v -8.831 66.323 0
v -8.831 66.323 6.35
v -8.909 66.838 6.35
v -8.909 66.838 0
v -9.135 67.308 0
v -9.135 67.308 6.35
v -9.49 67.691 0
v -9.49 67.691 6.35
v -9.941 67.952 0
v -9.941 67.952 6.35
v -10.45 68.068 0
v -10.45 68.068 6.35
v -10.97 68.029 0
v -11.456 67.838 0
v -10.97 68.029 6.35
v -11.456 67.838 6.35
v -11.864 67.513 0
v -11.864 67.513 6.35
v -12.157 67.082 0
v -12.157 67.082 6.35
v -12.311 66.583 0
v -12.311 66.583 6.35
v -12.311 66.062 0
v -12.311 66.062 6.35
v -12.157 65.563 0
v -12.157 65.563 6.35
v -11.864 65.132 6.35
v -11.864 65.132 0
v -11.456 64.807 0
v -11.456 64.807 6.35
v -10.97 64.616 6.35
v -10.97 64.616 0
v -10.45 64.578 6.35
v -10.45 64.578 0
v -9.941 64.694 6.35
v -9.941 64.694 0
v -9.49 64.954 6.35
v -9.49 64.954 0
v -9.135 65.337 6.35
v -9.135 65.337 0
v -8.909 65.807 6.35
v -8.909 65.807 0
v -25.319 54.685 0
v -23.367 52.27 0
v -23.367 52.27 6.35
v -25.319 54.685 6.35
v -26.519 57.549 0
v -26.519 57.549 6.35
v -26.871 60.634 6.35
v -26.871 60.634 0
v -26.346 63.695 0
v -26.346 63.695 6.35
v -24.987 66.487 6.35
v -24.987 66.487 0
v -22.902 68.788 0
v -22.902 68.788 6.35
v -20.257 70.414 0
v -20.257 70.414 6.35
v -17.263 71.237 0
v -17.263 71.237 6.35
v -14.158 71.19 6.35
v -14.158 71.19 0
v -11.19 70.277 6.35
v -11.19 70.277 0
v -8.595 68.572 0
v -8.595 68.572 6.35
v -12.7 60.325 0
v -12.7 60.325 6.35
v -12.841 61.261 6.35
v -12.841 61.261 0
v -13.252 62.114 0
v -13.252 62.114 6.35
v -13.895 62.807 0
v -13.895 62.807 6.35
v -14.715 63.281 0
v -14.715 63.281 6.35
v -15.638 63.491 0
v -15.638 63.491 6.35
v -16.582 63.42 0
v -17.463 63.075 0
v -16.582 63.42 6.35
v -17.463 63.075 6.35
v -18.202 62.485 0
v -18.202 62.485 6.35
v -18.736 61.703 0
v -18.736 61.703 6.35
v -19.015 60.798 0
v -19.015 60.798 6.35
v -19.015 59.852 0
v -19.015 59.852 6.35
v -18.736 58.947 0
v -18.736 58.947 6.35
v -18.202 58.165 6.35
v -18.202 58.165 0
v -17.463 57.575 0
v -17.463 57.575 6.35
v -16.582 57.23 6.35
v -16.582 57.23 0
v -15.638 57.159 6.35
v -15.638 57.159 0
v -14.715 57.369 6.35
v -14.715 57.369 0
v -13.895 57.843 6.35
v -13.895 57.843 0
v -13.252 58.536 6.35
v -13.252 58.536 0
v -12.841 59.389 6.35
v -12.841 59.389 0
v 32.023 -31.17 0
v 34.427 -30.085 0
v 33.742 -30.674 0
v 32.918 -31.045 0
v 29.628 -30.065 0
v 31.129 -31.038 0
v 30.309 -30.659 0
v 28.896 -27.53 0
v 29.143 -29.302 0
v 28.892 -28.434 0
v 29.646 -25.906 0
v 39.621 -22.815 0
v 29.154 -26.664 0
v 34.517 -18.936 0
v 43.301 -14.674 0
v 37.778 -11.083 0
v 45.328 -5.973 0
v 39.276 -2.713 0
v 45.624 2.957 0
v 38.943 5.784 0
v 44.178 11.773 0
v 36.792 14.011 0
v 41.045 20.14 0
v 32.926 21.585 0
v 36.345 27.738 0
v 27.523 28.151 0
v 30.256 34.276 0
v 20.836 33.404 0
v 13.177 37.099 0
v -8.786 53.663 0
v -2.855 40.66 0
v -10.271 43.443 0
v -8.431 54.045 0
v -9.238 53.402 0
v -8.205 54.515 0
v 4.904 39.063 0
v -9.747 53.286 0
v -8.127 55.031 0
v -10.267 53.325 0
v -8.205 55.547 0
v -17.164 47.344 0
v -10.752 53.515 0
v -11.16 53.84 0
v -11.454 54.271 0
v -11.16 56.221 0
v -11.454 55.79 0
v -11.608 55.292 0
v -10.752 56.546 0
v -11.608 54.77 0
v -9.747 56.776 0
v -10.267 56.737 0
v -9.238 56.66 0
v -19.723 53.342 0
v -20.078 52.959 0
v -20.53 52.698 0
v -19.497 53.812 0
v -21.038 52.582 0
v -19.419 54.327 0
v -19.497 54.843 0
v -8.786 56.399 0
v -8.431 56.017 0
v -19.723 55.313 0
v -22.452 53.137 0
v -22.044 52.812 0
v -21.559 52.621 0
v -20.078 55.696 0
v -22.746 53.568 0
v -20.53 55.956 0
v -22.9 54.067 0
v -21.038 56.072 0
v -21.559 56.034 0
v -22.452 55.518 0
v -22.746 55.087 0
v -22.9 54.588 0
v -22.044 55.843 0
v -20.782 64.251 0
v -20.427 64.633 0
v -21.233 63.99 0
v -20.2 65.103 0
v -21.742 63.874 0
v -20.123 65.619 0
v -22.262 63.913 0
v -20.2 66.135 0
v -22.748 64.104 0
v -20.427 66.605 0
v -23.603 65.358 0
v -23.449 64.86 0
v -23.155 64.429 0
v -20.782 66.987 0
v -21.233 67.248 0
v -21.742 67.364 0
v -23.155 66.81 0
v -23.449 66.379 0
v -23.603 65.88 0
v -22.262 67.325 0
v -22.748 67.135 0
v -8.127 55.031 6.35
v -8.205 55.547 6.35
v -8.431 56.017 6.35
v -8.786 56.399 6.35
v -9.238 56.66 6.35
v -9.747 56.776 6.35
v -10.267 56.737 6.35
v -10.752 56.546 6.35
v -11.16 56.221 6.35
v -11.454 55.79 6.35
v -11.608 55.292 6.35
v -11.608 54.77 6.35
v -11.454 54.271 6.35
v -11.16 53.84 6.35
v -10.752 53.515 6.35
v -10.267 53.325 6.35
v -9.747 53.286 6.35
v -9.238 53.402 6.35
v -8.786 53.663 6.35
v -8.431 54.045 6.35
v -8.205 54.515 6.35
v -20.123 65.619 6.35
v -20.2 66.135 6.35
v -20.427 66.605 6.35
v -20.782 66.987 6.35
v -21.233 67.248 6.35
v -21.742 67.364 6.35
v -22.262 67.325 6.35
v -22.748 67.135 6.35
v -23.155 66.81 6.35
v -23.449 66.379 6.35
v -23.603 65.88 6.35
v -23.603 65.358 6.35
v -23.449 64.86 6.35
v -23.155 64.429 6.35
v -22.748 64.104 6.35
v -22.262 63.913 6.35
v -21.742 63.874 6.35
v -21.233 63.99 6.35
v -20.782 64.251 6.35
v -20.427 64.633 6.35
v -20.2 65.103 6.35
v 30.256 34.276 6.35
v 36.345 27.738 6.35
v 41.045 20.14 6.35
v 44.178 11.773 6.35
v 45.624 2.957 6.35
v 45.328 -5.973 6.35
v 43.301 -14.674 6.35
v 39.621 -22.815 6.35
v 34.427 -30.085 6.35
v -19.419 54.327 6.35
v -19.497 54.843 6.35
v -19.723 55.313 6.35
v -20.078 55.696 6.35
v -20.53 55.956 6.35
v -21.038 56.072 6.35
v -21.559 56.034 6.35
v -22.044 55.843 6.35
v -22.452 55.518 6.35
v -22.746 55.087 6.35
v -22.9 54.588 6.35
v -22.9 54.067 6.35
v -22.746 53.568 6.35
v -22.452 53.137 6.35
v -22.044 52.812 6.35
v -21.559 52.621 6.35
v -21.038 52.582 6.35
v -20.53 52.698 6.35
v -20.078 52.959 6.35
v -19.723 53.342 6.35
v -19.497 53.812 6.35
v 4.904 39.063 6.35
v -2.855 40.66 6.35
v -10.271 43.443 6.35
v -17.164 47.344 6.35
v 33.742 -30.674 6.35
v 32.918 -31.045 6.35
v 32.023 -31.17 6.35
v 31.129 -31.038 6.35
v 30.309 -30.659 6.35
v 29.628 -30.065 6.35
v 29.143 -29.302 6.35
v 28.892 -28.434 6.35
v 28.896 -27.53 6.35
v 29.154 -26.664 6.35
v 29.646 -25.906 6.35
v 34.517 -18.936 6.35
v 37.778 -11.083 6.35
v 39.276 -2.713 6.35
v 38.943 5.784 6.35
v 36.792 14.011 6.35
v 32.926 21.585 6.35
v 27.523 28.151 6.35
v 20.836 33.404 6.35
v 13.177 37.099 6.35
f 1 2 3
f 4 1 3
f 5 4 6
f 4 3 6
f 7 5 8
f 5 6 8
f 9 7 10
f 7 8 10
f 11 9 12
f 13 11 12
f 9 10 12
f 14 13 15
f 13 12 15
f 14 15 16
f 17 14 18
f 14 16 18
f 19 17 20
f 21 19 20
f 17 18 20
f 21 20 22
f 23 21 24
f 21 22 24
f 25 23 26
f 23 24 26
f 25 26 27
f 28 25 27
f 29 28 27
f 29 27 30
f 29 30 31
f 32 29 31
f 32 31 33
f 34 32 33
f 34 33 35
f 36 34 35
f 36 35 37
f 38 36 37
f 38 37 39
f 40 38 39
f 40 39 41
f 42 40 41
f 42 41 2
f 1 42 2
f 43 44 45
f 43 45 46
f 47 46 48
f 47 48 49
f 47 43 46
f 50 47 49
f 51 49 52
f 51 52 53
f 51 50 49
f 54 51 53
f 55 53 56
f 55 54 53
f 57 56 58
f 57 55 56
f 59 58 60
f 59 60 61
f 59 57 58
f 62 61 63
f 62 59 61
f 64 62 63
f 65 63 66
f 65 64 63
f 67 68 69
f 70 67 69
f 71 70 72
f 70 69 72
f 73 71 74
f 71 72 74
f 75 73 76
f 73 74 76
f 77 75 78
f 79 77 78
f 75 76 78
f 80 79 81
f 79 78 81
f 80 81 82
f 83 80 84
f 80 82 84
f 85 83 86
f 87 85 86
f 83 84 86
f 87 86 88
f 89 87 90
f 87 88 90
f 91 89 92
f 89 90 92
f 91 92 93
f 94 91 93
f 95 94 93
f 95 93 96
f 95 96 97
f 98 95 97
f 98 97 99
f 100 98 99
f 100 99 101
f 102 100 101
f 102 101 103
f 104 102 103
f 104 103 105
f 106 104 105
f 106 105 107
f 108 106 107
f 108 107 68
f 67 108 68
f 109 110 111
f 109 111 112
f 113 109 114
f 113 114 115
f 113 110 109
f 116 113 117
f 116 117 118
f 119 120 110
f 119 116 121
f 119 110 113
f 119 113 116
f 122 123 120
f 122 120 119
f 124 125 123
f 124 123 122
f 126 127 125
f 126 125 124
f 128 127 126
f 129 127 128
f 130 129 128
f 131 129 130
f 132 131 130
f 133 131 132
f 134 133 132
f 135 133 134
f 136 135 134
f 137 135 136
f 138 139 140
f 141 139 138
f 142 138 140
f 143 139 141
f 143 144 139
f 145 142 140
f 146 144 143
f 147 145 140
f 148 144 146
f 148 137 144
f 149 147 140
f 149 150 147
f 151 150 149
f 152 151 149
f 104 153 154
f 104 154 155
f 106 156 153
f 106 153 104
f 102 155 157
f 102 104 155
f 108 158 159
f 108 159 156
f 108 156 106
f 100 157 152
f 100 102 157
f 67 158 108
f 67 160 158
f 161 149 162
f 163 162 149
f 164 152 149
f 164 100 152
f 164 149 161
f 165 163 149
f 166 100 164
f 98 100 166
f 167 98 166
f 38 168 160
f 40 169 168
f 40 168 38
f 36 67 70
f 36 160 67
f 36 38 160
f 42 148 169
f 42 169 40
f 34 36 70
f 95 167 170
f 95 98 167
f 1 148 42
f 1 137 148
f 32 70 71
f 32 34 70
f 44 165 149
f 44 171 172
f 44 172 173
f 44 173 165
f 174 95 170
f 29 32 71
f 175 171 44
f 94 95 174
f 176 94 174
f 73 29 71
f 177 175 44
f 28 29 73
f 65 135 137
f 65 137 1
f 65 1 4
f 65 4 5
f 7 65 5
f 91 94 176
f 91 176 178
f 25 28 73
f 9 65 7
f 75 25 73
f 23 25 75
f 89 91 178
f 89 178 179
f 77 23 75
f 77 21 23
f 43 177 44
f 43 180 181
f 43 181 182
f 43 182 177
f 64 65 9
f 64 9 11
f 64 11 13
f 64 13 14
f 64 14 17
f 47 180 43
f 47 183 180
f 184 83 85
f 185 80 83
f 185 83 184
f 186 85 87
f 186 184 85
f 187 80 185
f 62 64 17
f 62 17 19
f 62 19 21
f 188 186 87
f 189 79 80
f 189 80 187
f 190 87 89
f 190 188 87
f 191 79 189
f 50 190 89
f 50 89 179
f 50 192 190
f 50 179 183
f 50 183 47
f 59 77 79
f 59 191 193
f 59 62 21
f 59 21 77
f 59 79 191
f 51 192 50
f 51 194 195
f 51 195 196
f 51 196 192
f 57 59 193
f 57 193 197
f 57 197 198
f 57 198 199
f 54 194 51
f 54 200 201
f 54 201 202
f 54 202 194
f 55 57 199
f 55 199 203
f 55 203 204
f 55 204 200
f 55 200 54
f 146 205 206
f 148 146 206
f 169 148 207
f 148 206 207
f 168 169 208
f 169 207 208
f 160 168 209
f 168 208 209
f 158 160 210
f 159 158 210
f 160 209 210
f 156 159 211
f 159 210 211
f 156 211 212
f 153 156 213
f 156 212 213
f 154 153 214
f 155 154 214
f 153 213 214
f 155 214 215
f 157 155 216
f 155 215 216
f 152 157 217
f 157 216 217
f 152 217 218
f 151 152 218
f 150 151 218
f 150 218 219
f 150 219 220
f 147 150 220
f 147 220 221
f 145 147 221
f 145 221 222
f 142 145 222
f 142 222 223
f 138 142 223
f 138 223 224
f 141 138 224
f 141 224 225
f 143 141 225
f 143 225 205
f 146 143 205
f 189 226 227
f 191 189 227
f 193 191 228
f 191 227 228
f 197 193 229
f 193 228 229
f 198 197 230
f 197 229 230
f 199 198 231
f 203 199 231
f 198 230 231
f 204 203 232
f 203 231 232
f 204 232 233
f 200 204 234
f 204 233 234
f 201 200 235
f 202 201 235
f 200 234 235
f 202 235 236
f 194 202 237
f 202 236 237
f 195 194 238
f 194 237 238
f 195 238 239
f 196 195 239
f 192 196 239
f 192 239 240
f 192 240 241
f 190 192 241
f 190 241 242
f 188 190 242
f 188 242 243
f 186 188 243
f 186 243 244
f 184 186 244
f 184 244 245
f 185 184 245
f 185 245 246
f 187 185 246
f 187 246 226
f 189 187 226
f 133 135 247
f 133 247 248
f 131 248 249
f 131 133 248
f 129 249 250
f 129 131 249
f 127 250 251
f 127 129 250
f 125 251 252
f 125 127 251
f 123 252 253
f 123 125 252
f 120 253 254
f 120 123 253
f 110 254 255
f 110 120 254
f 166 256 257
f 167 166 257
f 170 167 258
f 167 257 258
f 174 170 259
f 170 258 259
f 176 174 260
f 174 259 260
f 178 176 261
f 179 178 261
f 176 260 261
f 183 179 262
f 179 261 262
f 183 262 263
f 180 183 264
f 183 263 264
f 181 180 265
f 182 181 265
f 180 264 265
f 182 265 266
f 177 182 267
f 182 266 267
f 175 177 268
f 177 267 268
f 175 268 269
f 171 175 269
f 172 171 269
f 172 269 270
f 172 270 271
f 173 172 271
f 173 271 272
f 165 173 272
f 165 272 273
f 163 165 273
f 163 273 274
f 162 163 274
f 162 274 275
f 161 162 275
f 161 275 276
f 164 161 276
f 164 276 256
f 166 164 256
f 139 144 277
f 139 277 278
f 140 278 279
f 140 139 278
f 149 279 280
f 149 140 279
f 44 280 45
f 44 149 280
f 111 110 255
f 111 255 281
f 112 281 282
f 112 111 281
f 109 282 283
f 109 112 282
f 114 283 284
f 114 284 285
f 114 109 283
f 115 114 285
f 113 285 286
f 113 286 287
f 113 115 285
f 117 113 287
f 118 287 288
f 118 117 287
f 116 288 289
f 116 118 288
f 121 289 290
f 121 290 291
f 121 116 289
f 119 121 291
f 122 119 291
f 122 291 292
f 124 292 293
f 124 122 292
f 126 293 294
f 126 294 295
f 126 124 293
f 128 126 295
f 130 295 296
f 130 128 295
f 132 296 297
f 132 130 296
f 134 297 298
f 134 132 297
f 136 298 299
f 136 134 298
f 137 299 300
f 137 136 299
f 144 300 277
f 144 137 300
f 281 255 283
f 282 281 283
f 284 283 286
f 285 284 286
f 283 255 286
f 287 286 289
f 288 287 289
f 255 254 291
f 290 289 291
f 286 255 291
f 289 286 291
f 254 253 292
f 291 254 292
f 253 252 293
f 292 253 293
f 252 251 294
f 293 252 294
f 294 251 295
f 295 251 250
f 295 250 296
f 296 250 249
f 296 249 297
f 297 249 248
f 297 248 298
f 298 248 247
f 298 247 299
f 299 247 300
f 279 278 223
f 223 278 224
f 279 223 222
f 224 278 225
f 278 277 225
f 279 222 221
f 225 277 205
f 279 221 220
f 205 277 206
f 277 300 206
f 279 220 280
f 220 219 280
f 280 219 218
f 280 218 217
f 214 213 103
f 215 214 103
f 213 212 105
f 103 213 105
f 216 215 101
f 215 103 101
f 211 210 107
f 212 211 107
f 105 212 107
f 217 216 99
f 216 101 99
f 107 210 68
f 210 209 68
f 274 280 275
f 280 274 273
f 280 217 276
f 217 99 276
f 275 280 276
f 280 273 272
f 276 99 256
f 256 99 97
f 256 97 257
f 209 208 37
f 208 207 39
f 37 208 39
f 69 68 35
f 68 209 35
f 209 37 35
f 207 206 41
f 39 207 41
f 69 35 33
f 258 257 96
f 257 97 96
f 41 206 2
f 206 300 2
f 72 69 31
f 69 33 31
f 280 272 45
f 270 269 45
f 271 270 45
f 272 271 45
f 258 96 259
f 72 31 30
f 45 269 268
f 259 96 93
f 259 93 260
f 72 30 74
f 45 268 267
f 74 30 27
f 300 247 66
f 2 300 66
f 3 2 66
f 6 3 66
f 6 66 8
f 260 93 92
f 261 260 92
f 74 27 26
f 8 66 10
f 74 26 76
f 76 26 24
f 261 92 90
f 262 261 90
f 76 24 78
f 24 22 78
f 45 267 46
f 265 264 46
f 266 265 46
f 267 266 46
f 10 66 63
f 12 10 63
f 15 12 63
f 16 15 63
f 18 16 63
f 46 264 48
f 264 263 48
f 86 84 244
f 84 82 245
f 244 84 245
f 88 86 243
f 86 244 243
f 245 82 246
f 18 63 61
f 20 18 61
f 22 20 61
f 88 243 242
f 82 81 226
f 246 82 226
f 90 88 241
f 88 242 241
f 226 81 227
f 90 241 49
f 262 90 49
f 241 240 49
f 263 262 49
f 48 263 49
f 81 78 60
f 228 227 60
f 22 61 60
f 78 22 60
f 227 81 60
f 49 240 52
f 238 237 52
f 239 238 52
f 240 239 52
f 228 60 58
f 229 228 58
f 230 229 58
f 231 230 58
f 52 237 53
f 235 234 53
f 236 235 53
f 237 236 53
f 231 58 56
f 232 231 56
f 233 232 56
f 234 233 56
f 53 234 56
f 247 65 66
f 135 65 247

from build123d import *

# Parameters (mm, degrees)
BOSS_EXTRUDE1_DEPTH = 6.35
SKETCH2_R           = 3.175
SKETCH2_R_2         = 1.75
CUT_EXTRUDE1_DEPTH  = 7.35


with BuildPart() as part:
    # Sketch1 → Boss-Extrude1 (new body)
    with BuildSketch(Plane.XY):
        with BuildLine():
            Line((-8.595455009, 68.571709933), (30.25643609, 34.276325287))
            ThreePointArc((30.25643609, 34.276325287), (45.624300947, 2.956613457), (34.427247837, -30.084597493))
            ThreePointArc((34.427247837, -30.084597493), (29.947258578, -30.386170434), (29.645685638, -25.906181175))
            ThreePointArc((29.645685638, -25.906181175), (36.792348261, 14.011424249), (4.903675305, 39.063421106))
            ThreePointArc((4.903675305, 39.063421106), (-10.270602503, 43.44261231), (-23.366607565, 52.270447493))
            ThreePointArc((-23.366607565, 52.270447493), (-24.02632087, 67.711201194), (-8.595455009, 68.571709933))
        make_face()
    extrude(amount=BOSS_EXTRUDE1_DEPTH)

    # Sketch2 → Cut-Extrude1 (cut, through all)
    with BuildSketch(Plane.XY.offset(6.35)):
        with Locations((-15.875, 60.325)):
            Circle(SKETCH2_R)
        with Locations((-10.580785461, 66.322607224)):
            Circle(SKETCH2_R_2)
        with Locations((-9.877392776, 55.030785461)):
            Circle(SKETCH2_R_2)
        with Locations((-21.169214539, 54.327392776)):
            Circle(SKETCH2_R_2)
        with Locations((-21.872607224, 65.619214539)):
            Circle(SKETCH2_R_2)
    extrude(amount=-CUT_EXTRUDE1_DEPTH, mode=Mode.SUBTRACT)


solid = part.part
